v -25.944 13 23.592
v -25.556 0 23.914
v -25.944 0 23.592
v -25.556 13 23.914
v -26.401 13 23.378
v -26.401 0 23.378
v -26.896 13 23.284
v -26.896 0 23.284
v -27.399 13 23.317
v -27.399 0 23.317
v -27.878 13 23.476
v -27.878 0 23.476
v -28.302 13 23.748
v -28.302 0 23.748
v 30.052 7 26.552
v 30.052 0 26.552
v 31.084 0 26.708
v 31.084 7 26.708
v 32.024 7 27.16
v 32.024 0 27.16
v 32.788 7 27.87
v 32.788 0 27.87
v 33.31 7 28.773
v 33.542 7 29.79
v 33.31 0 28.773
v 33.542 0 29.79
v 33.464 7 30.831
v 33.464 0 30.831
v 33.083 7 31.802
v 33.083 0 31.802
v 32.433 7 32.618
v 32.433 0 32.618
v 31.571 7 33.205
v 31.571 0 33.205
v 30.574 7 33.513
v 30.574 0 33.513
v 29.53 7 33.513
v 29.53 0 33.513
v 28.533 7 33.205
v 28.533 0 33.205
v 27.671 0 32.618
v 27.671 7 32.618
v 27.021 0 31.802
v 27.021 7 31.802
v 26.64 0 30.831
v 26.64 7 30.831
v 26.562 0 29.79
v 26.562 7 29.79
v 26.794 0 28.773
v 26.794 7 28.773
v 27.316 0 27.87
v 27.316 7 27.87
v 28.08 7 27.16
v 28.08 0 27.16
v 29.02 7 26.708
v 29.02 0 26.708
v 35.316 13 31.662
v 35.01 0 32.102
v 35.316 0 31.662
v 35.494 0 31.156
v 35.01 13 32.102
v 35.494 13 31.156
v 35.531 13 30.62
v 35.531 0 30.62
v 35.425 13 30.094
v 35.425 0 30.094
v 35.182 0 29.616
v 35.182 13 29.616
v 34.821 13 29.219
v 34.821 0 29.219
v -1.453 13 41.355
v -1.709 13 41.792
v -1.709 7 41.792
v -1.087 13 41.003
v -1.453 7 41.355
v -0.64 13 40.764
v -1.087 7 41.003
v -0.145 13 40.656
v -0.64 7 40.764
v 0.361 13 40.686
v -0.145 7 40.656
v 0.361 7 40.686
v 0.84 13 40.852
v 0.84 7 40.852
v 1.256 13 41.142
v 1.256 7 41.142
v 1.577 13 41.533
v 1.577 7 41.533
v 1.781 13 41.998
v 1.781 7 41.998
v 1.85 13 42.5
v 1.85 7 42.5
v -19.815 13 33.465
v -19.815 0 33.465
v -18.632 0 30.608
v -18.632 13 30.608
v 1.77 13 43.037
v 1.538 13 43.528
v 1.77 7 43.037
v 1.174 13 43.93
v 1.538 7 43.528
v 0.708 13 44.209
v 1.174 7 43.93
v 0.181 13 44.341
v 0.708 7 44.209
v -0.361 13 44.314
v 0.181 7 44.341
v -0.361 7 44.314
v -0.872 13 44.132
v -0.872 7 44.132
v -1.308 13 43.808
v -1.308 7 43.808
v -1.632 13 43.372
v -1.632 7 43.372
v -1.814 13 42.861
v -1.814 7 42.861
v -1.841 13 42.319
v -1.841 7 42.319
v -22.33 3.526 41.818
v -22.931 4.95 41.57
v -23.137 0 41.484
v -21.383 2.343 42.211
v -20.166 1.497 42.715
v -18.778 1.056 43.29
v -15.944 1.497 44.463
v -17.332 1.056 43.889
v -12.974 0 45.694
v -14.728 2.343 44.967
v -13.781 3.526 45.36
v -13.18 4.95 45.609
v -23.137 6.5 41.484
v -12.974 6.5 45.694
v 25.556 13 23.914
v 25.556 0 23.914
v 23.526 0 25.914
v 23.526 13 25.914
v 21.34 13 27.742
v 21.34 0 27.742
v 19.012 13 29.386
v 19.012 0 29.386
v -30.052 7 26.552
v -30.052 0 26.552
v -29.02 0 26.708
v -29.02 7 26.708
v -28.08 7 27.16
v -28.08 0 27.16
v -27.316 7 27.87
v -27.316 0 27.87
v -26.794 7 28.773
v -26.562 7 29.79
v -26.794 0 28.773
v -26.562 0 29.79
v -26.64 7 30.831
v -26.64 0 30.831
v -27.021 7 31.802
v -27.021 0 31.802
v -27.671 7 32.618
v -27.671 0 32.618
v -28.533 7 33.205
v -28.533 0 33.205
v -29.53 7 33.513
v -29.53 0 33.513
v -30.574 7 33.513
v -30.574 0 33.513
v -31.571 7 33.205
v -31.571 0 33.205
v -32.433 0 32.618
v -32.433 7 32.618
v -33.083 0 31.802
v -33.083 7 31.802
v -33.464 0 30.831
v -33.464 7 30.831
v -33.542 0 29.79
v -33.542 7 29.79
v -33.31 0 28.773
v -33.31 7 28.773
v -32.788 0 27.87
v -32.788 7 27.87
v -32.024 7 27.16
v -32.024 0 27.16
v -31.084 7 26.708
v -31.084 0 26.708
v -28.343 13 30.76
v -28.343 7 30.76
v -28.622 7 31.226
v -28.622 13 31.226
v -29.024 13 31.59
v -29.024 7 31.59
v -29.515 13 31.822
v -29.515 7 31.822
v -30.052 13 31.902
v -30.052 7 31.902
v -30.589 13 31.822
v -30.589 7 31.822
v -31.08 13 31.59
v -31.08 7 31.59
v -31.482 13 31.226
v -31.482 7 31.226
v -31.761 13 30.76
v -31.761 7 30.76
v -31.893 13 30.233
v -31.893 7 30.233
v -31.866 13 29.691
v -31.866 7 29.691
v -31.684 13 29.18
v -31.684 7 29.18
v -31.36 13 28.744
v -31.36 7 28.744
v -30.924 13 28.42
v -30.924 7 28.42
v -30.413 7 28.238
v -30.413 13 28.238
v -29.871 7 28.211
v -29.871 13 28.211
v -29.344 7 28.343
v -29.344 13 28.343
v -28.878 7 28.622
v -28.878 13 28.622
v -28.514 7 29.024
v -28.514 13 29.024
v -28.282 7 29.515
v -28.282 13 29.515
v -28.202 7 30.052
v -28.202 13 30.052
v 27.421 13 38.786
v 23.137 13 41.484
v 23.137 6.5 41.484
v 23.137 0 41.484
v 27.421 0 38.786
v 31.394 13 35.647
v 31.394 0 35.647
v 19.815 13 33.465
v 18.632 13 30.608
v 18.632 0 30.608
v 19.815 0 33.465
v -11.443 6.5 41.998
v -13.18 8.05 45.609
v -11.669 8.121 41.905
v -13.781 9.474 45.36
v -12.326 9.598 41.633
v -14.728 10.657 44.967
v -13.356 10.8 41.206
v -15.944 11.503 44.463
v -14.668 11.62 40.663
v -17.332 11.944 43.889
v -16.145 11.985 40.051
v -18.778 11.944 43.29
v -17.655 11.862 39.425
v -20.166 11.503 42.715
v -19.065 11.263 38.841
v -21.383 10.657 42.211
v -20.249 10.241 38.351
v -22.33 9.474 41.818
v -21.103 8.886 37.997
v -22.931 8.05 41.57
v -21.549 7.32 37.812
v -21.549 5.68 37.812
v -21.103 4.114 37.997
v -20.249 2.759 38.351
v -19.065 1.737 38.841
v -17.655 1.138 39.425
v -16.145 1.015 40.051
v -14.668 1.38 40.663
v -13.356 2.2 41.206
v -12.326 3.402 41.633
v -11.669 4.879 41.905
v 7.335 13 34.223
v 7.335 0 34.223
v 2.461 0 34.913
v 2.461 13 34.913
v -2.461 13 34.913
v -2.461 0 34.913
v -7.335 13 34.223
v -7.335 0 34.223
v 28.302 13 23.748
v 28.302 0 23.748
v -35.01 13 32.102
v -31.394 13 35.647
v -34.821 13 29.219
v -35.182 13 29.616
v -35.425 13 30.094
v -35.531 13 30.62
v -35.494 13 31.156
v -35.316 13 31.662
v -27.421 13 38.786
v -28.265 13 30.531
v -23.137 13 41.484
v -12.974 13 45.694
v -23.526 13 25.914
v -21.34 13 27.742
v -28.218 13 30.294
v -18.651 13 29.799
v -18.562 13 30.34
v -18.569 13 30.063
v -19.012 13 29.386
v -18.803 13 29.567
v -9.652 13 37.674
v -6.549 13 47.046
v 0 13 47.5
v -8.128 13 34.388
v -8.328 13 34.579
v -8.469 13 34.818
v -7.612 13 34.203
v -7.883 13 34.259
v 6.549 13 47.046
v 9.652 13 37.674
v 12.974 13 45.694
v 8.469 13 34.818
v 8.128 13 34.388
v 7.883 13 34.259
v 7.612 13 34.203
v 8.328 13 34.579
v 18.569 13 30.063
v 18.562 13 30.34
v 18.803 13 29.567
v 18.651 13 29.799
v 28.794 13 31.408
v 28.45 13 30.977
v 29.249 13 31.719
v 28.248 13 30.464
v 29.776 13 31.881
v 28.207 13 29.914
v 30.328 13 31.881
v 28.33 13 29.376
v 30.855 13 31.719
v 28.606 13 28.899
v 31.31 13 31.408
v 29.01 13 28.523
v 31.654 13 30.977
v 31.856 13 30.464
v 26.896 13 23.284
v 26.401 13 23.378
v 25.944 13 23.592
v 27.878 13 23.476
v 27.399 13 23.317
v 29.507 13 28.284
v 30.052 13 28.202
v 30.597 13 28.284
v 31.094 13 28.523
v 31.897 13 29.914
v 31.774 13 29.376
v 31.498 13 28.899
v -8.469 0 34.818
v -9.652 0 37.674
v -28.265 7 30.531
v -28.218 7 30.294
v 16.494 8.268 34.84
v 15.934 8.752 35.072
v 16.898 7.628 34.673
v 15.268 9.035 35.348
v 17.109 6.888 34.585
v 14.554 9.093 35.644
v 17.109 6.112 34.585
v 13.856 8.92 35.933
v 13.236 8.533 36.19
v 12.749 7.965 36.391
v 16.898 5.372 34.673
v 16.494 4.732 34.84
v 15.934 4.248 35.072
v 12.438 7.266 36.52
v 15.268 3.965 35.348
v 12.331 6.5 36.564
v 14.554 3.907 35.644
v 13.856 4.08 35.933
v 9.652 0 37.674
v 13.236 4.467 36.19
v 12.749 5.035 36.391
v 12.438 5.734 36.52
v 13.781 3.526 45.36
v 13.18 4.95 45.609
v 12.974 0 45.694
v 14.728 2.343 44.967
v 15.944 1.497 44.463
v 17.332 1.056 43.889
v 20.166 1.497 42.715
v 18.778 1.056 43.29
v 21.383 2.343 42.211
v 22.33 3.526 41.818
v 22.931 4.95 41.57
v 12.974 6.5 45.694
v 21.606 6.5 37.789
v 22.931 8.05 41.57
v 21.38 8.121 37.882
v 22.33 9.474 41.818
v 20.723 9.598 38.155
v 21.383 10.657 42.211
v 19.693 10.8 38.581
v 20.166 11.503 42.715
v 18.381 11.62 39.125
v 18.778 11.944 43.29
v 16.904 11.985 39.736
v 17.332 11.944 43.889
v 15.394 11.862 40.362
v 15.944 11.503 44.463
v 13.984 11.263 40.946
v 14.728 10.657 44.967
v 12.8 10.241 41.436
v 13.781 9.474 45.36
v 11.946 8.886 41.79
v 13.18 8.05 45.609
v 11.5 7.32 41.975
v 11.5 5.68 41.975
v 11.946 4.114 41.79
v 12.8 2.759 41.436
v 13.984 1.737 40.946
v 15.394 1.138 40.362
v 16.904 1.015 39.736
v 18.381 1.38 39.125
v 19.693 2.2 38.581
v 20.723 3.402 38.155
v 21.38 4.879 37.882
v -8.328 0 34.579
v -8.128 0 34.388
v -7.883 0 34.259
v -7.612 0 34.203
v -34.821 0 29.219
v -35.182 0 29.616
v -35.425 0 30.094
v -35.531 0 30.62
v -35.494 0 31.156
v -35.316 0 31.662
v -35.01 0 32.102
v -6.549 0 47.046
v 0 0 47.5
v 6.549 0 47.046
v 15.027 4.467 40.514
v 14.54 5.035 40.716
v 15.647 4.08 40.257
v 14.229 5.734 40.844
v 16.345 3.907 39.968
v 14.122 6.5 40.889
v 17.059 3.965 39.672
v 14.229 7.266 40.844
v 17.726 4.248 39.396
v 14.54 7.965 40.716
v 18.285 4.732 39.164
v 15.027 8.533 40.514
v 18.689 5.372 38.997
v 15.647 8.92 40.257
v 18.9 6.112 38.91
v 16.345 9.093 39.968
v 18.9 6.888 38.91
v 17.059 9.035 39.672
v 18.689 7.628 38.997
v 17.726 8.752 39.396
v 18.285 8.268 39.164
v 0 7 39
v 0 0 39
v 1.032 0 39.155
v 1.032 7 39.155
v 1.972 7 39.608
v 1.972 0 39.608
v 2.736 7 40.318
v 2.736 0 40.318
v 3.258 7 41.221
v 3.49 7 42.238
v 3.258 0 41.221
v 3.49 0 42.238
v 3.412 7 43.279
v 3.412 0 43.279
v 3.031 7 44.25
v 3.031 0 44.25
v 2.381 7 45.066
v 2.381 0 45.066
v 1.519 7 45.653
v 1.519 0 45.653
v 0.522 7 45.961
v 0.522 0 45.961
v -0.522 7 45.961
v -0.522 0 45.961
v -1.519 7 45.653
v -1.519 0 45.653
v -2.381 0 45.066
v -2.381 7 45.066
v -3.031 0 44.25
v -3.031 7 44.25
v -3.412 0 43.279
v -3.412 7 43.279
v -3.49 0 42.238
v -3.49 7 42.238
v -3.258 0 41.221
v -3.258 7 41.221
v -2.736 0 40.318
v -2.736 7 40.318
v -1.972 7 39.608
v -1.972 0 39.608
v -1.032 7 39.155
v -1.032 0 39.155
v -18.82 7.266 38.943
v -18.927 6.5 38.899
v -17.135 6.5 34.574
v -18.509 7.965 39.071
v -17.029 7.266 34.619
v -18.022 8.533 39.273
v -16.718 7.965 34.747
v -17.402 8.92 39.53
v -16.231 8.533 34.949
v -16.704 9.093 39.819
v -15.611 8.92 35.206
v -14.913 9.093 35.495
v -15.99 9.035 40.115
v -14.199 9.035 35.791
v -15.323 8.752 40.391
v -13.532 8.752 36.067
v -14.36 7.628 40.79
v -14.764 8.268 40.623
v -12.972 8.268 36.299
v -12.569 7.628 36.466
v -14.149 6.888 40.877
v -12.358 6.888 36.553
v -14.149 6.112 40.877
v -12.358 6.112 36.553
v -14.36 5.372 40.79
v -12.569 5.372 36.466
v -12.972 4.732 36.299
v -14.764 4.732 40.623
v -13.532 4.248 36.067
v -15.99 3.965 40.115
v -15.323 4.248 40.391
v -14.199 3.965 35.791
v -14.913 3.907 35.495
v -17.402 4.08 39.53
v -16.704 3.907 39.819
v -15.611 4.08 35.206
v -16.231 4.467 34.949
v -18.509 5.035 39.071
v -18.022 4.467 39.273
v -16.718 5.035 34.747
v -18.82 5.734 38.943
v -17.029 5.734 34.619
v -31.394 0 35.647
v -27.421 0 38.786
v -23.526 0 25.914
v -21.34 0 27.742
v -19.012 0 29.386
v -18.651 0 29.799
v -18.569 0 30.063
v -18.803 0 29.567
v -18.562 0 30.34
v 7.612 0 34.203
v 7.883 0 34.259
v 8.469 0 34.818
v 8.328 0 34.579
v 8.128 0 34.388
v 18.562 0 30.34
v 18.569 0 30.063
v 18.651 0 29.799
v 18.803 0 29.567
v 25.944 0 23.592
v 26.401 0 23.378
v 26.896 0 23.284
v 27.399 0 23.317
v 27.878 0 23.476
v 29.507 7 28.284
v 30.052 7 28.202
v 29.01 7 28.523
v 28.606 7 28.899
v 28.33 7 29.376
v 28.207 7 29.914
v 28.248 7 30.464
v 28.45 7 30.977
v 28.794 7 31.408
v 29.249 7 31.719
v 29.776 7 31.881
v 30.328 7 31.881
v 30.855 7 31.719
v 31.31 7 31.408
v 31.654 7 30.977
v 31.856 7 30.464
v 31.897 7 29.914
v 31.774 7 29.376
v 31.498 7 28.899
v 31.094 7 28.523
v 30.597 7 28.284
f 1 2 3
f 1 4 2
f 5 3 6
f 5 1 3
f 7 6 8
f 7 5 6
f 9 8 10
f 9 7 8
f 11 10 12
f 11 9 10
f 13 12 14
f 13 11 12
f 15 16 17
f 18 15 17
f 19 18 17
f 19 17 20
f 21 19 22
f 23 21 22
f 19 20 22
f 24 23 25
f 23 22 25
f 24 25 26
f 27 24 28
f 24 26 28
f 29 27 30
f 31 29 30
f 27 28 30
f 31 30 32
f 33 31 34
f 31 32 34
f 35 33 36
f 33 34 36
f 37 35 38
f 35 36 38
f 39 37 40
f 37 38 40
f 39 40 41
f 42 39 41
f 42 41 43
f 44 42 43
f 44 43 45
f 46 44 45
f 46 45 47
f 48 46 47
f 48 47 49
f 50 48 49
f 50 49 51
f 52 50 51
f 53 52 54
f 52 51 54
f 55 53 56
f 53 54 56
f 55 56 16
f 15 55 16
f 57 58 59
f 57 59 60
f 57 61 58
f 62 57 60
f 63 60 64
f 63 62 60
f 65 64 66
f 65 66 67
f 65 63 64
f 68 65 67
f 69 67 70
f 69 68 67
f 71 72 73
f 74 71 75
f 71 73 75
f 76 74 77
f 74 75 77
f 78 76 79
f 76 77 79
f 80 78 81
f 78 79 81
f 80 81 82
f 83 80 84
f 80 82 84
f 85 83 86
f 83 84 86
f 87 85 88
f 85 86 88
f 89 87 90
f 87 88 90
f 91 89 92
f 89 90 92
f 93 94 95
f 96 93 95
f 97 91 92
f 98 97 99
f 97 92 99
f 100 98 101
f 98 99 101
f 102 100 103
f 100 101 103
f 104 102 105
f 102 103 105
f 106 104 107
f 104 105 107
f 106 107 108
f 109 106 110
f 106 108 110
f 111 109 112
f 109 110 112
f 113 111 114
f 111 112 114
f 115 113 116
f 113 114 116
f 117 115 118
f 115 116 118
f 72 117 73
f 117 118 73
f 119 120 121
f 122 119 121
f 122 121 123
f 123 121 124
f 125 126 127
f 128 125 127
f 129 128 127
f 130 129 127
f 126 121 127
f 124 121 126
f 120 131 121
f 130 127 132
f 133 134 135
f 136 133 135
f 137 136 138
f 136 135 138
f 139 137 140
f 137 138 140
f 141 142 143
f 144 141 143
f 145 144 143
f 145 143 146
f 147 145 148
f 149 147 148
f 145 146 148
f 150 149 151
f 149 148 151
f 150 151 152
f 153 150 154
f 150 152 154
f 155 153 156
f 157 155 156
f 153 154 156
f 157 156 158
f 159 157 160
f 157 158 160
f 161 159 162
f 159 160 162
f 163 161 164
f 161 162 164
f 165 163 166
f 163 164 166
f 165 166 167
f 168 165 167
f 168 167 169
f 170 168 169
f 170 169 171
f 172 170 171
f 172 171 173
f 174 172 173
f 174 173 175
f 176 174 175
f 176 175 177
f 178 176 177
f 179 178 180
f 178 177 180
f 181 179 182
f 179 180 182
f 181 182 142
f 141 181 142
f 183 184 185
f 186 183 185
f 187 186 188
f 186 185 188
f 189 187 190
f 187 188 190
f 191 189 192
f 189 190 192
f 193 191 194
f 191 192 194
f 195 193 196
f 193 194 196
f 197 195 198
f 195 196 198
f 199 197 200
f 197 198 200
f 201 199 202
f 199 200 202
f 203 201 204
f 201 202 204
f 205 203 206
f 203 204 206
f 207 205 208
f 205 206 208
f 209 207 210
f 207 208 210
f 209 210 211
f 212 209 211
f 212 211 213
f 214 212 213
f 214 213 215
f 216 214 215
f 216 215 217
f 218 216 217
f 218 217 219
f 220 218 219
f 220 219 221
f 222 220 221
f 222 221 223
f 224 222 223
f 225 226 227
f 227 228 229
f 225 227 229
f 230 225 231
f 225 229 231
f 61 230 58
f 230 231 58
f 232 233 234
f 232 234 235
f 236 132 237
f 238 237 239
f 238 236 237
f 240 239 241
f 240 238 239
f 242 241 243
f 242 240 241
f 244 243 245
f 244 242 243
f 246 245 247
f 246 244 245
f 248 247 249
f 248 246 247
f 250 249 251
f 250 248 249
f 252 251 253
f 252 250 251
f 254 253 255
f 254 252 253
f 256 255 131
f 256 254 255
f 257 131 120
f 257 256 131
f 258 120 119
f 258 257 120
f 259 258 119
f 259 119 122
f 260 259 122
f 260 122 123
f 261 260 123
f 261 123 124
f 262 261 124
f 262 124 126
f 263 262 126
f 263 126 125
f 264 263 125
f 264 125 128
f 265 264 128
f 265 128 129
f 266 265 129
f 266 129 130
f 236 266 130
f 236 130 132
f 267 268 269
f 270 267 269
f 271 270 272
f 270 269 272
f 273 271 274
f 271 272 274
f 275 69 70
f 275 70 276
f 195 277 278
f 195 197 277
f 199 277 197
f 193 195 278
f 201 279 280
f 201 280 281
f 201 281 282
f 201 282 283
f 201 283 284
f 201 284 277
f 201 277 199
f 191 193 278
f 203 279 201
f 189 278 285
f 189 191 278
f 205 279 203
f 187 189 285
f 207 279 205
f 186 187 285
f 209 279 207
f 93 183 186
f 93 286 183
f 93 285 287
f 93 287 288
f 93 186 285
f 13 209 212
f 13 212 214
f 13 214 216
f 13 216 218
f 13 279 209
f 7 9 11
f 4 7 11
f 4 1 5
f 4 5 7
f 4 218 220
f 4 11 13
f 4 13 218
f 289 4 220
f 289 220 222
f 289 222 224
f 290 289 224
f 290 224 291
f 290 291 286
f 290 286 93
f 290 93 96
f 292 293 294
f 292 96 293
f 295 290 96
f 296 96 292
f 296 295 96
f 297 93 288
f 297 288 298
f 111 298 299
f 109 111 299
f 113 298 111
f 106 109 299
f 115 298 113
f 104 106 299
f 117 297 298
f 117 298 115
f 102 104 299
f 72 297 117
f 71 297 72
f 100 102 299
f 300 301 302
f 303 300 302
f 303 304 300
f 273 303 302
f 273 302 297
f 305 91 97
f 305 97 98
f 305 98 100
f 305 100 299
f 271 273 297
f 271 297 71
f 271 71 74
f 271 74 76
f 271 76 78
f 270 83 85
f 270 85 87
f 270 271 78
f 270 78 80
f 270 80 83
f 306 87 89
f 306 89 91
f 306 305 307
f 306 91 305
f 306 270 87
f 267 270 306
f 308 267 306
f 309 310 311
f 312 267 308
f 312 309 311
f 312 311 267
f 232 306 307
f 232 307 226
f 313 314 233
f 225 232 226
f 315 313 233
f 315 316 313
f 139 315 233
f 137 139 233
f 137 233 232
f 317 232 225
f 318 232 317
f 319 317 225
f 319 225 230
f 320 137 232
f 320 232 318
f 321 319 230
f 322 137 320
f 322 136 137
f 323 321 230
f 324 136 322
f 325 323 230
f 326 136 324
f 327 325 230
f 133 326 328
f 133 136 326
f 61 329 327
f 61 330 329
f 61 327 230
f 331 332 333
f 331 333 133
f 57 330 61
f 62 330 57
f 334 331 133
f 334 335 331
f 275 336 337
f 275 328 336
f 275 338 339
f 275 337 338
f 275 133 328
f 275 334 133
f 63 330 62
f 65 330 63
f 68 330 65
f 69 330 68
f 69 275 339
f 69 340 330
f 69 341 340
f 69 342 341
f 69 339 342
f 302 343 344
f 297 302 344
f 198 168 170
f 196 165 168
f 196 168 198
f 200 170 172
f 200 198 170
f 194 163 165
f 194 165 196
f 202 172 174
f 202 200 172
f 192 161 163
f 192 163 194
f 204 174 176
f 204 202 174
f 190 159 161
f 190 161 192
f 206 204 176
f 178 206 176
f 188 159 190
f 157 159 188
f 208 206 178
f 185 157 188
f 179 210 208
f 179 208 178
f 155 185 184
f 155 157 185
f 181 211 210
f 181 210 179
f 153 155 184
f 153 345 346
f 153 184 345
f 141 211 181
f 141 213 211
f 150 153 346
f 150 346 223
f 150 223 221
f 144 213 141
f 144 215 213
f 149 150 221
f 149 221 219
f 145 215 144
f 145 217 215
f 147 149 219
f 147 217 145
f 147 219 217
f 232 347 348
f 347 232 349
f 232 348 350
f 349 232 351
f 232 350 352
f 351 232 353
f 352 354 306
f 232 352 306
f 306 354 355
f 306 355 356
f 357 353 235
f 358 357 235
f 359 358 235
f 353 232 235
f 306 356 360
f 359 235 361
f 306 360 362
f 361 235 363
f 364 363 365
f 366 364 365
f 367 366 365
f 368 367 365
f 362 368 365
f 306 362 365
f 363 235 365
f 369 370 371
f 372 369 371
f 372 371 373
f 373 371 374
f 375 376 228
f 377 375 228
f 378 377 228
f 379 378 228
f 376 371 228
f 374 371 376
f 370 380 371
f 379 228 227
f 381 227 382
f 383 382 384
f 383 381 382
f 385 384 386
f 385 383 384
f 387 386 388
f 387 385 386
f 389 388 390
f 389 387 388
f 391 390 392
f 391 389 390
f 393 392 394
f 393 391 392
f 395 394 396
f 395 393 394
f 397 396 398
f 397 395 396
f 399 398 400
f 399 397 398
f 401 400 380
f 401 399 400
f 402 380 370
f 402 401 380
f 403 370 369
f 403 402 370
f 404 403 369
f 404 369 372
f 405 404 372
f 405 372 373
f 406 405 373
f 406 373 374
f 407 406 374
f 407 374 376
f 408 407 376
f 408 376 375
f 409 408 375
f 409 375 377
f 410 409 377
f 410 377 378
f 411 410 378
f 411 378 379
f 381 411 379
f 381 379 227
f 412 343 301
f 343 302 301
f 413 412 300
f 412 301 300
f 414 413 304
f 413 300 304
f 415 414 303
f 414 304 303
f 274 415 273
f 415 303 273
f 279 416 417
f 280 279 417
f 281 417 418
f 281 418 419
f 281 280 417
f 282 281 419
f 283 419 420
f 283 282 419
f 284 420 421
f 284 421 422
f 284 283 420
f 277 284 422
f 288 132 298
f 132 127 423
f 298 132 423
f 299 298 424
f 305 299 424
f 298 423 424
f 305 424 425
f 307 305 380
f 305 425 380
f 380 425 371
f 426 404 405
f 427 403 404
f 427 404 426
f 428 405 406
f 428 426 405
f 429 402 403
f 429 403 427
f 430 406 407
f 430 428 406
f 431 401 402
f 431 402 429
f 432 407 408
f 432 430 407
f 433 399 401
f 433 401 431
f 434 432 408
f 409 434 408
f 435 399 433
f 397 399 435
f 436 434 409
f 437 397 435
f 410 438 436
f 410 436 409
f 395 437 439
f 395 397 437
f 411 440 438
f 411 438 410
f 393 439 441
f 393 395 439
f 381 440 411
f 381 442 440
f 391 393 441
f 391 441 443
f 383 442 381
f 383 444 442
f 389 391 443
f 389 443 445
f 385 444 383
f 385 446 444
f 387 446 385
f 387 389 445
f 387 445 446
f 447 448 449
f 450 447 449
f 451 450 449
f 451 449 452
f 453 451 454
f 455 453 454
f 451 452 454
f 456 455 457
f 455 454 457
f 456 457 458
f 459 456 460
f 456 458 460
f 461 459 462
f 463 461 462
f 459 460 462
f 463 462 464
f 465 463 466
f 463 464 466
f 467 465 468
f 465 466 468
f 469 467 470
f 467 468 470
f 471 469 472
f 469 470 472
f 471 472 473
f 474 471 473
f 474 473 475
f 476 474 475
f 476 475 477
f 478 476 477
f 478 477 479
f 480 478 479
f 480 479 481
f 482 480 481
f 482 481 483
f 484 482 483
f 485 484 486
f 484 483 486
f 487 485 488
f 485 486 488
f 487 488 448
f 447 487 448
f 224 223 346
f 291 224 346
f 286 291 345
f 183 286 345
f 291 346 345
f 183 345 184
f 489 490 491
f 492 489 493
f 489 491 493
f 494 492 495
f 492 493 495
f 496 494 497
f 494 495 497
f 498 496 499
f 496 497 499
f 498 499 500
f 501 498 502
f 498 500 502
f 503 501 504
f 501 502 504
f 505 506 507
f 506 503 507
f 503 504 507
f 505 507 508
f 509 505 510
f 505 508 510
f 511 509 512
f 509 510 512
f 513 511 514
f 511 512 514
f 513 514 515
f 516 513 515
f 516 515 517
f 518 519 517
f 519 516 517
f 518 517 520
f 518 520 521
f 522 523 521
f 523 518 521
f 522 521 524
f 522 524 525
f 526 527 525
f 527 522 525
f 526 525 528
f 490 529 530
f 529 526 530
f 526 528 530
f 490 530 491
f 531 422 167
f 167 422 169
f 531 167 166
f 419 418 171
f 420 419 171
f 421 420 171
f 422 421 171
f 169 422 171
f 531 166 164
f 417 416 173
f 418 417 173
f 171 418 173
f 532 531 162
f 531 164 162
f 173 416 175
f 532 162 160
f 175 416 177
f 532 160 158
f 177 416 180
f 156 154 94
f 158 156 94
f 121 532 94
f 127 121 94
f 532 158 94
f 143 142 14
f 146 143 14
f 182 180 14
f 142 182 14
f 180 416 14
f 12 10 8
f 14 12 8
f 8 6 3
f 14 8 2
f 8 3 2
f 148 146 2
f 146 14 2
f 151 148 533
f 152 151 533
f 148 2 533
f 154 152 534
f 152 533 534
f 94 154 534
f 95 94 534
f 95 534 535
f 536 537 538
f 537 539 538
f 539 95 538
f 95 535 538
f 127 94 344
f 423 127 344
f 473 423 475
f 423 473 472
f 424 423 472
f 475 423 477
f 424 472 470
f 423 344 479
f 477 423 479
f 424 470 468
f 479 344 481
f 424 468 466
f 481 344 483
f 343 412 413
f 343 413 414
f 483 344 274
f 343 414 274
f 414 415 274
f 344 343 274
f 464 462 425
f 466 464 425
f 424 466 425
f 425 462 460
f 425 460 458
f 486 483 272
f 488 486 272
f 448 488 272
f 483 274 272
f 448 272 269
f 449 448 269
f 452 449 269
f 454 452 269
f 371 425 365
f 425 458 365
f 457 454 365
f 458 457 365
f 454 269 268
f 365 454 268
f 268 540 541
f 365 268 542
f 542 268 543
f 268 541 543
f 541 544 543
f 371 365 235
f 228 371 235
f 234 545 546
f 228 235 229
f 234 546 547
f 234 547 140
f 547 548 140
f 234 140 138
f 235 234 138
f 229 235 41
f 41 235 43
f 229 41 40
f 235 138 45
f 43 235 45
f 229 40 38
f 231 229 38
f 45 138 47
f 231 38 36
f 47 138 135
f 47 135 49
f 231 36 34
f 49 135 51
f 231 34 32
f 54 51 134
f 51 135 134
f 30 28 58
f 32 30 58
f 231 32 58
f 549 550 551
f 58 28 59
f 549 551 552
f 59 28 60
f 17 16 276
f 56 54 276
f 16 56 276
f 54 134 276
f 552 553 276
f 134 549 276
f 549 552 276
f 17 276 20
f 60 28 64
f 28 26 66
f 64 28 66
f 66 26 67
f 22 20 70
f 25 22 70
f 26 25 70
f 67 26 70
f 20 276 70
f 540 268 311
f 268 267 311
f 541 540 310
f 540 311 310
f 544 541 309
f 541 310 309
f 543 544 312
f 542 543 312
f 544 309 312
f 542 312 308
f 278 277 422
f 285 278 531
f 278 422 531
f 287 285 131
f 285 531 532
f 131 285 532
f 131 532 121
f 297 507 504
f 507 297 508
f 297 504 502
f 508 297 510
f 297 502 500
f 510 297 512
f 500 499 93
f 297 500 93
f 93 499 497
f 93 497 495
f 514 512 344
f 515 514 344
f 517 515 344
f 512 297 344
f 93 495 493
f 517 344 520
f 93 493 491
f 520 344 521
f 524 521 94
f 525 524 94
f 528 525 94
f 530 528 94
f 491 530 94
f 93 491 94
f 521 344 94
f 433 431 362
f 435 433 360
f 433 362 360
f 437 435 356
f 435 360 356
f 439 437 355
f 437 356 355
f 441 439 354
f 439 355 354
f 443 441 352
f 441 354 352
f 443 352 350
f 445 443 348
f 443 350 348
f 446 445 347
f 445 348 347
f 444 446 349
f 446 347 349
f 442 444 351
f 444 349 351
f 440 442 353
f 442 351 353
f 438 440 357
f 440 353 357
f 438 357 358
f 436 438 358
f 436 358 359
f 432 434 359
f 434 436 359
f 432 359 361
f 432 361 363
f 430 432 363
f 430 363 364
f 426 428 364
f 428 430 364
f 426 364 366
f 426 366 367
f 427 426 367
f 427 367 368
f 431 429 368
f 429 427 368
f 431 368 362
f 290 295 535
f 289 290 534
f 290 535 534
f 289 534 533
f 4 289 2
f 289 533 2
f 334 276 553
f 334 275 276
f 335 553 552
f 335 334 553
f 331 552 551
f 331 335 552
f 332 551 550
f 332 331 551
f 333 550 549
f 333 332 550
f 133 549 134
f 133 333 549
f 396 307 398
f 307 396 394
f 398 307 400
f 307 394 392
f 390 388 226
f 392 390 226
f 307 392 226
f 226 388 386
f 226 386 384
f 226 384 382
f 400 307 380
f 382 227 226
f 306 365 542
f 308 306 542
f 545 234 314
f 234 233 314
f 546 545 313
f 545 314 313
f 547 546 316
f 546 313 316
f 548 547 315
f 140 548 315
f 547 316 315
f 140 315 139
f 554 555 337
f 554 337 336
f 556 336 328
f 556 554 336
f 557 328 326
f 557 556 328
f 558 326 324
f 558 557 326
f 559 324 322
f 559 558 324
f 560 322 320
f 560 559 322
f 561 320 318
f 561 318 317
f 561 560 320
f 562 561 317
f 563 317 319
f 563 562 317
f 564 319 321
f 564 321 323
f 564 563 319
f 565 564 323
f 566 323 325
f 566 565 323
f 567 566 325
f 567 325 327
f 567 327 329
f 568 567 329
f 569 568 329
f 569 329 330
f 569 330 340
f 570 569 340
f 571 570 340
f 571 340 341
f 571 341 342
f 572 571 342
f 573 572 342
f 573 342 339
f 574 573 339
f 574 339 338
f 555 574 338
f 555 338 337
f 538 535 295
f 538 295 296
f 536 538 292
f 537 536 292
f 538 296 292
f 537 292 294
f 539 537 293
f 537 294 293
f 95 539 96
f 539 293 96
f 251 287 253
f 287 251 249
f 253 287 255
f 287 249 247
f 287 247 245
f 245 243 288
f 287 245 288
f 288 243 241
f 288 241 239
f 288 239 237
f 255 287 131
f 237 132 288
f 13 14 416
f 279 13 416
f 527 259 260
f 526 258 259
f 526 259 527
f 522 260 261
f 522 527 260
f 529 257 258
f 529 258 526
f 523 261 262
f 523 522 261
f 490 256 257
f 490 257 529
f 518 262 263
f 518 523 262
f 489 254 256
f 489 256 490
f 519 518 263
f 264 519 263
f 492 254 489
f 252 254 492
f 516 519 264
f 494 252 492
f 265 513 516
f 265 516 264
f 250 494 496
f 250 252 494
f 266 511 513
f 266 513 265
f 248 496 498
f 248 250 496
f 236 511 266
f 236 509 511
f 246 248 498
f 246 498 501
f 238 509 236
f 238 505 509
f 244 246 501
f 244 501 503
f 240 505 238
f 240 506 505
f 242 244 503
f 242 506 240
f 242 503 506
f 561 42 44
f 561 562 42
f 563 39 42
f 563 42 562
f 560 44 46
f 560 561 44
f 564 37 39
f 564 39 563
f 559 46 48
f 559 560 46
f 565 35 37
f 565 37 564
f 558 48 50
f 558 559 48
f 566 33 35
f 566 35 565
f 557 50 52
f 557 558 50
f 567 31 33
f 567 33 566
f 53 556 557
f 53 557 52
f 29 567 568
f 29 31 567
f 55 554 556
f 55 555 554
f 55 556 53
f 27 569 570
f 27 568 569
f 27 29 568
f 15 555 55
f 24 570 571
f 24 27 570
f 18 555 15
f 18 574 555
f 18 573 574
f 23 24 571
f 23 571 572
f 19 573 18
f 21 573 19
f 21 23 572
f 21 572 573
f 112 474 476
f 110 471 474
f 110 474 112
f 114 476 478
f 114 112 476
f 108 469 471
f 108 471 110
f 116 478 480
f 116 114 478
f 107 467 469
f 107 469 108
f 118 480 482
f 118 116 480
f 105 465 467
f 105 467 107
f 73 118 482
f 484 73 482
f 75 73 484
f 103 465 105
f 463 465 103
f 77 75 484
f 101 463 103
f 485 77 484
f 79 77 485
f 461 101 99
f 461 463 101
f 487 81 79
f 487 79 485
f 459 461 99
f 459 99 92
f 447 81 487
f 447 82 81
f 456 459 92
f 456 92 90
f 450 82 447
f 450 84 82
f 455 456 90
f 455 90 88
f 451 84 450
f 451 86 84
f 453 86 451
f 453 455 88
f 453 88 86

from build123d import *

# Parameters (mm, degrees)
SKETCH_1_R          = 1.85
EXTRUDE_1_DEPTH     = 13
SKETCH_2_R          = 2.6
CUT_EXTRUDE_1_DEPTH = 10
SKETCH_3_R          = 2.6
CUT_EXTRUDE_2_DEPTH = 10
FILLET_1_R          = 2
FILLET_2_R          = 1
SKETCH_4_R          = 3.5
SKETCH_4_R_2        = 1.85
CUT_EXTRUDE_3_DEPTH = 7
CUT_EXTRUDE_5_DEPTH = 61.729236251
CUT_EXTRUDE_START   = -4
SKETCH_6_R          = 5.5
SKETCH_6_R_2        = 2.6
CUT_EXTRUDE_6_DEPTH = 4
SKETCH_7_R          = 5.5
SKETCH_7_R_2        = 2.6
CUT_EXTRUDE_7_DEPTH = 4


with BuildPart() as part:
    # 草图1 → 凸台-拉伸1 (new body)
    with BuildSketch(Plane(origin=(0, 0, 0), x_dir=(1, 0, 0), z_dir=(0, 1, 0))):
        with BuildLine():
            ThreePointArc((-18.308849916, -29.829281164), (-22.856098901, -26.50657924), (-26.811555509, -22.497566339))
            Line((-26.811555509, -22.497566339), (-36.387111048, -30.53241146))
            ThreePointArc((-36.387111048, -30.53241146), (0, -47.5), (36.387111048, -30.53241146))
            Line((36.387111048, -30.53241146), (26.811555509, -22.497566339))
            ThreePointArc((26.811555509, -22.497566339), (22.856098901, -26.50657924), (18.308849916, -29.829281164))
            Line((18.308849916, -29.829281164), (19.814649575, -33.464603124))
            Line((19.814649575, -33.464603124), (9.651974717, -37.67412088))
            Line((9.651974717, -37.67412088), (8.146175058, -34.03879892))
            ThreePointArc((8.146175058, -34.03879892), (0, -35), (-8.146175058, -34.03879892))
            Line((-8.146175058, -34.03879892), (-9.651974717, -37.67412088))
            Line((-9.651974717, -37.67412088), (-19.814649575, -33.464603124))
            Line((-19.814649575, -33.464603124), (-18.308849916, -29.829281164))
        make_face()
        with BuildLine():
            ThreePointArc((-28.2020382, -30.0520382), (-28.237585432, -30.412955296), (-28.342861065, -30.76000255))
            ThreePointArc((-28.342861065, -30.76000255), (-31.866490969, -29.691121105), (-28.2020382, -30.0520382))
        make_face(mode=Mode.SUBTRACT)
        with BuildLine():
            ThreePointArc((1.85, -42.5), (-0.360917096, -44.314452769), (-1.709177135, -41.79203565))
            ThreePointArc((-1.709177135, -41.79203565), (0.360917096, -40.685547231), (1.85, -42.5))
        make_face(mode=Mode.SUBTRACT)
        with Locations(Location((30.0520382, -30.0520382, 0), (0, 0, 90))):
            Circle(SKETCH_1_R, mode=Mode.SUBTRACT)
    extrude(amount=EXTRUDE_1_DEPTH)

    # 草图2 → 切除-拉伸1 (cut)
    with BuildSketch(Plane(origin=(-14.733312146, 0, 35.569362002), x_dir=(-0.9238795325112864, 0, -0.38268343236509067), z_dir=(0.38268343236509067, 0, -0.9238795325112864))):
        with Locations((0, 6.5)):
            Circle(SKETCH_2_R)
    extrude(amount=-CUT_EXTRUDE_1_DEPTH, mode=Mode.SUBTRACT)

    # 草图3 → 切除-拉伸2 (cut)
    with BuildSketch(Plane(origin=(14.733312146, 0, 35.569362002), x_dir=(-0.9238795325112864, 0, 0.38268343236509067), z_dir=(-0.38268343236509067, 0, -0.9238795325112864))):
        with Locations((0, 6.5)):
            Circle(SKETCH_3_R)
    extrude(amount=-CUT_EXTRUDE_2_DEPTH, mode=Mode.SUBTRACT)

    # 圆角1
    fillet_1_edges = [part.edges().sort_by_distance(p)[0] for p in [
        (-26.811555509, 6.5, 22.497566339),
        (26.811555509, 6.5, 22.497566339),
        (36.387111048, 6.5, 30.53241146),
        (-36.387111048, 6.5, 30.53241146),
    ]]
    fillet(fillet_1_edges, radius=FILLET_1_R)

    # 圆角2
    fillet_2_edges = [part.edges().sort_by_distance(p)[0] for p in [
        (-18.308849916, 6.5, 29.829281164),
        (-8.146175058, 6.5, 34.03879892),
        (8.146175058, 6.5, 34.03879892),
        (18.308849916, 6.5, 29.829281164),
    ]]
    fillet(fillet_2_edges, radius=FILLET_2_R)

    # 草图4 → 切除-拉伸3 (cut)
    # profile 1 of 3: a face of its own
    with BuildSketch(Plane.XZ):
        with Locations(Location((-30.0520382, 30.0520382, 0), (0, 0, 270))):
            Circle(SKETCH_4_R)
        with Locations(Location((-30.0520382, 30.0520382, 0), (0, 0, 270))):
            Circle(SKETCH_4_R_2, mode=Mode.SUBTRACT)
    # profile 2 of 3: a face of its own
    with BuildSketch(Plane.XZ):
        with Locations(Location((0, 42.5, 0), (0, 0, 270))):
            Circle(SKETCH_4_R)
        with Locations(Location((0, 42.5, 0), (0, 0, 270))):
            Circle(SKETCH_4_R_2, mode=Mode.SUBTRACT)
    # profile 3 of 3: a face of its own
    with BuildSketch(Plane.XZ):
        with Locations(Location((30.0520382, 30.0520382, 0), (0, 0, 270))):
            Circle(SKETCH_4_R)
        with Locations(Location((30.0520382, 30.0520382, 0), (0, 0, 270))):
            Circle(SKETCH_4_R_2, mode=Mode.SUBTRACT)
    extrude(amount=-CUT_EXTRUDE_3_DEPTH, mode=Mode.SUBTRACT)

    # 草图5 → 切除-拉伸5 (cut, through all)
    with BuildSketch(Plane.XZ):
        with BuildLine():
            Line((-23.136534812, 41.484343515), (-18.055197383, 43.589102393))
            Line((-18.055197383, 43.589102393), (-18.177463037, 43.884277794))
            ThreePointArc((-18.177463037, 43.884277794), (-20.691822677, 42.756268246), (-23.136534812, 41.484343515))
        make_face()
        with BuildLine():
            Line((-18.177463037, 43.884277794), (-18.055197383, 43.589102393))
            Line((-18.055197383, 43.589102393), (-12.973859954, 45.693861271))
            ThreePointArc((-12.973859954, 45.693861271), (-15.601919085, 44.864575345), (-18.177463037, 43.884277794))
        make_face()
        with BuildLine():
            ThreePointArc((18.177463037, 43.884277794), (15.601919085, 44.864575345), (12.973859954, 45.693861271))
            Line((12.973859954, 45.693861271), (18.055197383, 43.589102393))
            Line((18.055197383, 43.589102393), (18.177463037, 43.884277794))
        make_face()
        with BuildLine():
            Line((18.177463037, 43.884277794), (18.055197383, 43.589102393))
            Line((18.055197383, 43.589102393), (23.136534812, 41.484343515))
            ThreePointArc((23.136534812, 41.484343515), (20.691822677, 42.756268246), (18.177463037, 43.884277794))
        make_face()
    extrude(amount=-CUT_EXTRUDE_5_DEPTH, mode=Mode.SUBTRACT)

    # 草图6 → 切除-拉伸6 (cut)
    with BuildSketch(Plane(origin=(-18.055197383, 0, 43.589102393), x_dir=(0.9238795325112865, 0, 0.38268343236509045), z_dir=(-0.38268343236509045, 0, 0.9238795325112865)).offset(CUT_EXTRUDE_START)):
        with Locations((0, 6.5)):
            Circle(SKETCH_6_R)
        with Locations(Location((0, 6.5, 0), (0, 0, 180))):
            Circle(SKETCH_6_R_2, mode=Mode.SUBTRACT)
    extrude(amount=CUT_EXTRUDE_6_DEPTH, mode=Mode.SUBTRACT)

    # 草图7 → 切除-拉伸7 (cut)
    with BuildSketch(Plane(origin=(18.055197383, 0, 43.589102393), x_dir=(0.9238795325112865, 0, -0.38268343236509045), z_dir=(0.38268343236509045, 0, 0.9238795325112865)).offset(CUT_EXTRUDE_START)):
        with Locations((0, 6.5)):
            Circle(SKETCH_7_R)
        with Locations(Location((0, 6.5, 0), (0, 0, 180))):
            Circle(SKETCH_7_R_2, mode=Mode.SUBTRACT)
    extrude(amount=CUT_EXTRUDE_7_DEPTH, mode=Mode.SUBTRACT)


solid = part.part
